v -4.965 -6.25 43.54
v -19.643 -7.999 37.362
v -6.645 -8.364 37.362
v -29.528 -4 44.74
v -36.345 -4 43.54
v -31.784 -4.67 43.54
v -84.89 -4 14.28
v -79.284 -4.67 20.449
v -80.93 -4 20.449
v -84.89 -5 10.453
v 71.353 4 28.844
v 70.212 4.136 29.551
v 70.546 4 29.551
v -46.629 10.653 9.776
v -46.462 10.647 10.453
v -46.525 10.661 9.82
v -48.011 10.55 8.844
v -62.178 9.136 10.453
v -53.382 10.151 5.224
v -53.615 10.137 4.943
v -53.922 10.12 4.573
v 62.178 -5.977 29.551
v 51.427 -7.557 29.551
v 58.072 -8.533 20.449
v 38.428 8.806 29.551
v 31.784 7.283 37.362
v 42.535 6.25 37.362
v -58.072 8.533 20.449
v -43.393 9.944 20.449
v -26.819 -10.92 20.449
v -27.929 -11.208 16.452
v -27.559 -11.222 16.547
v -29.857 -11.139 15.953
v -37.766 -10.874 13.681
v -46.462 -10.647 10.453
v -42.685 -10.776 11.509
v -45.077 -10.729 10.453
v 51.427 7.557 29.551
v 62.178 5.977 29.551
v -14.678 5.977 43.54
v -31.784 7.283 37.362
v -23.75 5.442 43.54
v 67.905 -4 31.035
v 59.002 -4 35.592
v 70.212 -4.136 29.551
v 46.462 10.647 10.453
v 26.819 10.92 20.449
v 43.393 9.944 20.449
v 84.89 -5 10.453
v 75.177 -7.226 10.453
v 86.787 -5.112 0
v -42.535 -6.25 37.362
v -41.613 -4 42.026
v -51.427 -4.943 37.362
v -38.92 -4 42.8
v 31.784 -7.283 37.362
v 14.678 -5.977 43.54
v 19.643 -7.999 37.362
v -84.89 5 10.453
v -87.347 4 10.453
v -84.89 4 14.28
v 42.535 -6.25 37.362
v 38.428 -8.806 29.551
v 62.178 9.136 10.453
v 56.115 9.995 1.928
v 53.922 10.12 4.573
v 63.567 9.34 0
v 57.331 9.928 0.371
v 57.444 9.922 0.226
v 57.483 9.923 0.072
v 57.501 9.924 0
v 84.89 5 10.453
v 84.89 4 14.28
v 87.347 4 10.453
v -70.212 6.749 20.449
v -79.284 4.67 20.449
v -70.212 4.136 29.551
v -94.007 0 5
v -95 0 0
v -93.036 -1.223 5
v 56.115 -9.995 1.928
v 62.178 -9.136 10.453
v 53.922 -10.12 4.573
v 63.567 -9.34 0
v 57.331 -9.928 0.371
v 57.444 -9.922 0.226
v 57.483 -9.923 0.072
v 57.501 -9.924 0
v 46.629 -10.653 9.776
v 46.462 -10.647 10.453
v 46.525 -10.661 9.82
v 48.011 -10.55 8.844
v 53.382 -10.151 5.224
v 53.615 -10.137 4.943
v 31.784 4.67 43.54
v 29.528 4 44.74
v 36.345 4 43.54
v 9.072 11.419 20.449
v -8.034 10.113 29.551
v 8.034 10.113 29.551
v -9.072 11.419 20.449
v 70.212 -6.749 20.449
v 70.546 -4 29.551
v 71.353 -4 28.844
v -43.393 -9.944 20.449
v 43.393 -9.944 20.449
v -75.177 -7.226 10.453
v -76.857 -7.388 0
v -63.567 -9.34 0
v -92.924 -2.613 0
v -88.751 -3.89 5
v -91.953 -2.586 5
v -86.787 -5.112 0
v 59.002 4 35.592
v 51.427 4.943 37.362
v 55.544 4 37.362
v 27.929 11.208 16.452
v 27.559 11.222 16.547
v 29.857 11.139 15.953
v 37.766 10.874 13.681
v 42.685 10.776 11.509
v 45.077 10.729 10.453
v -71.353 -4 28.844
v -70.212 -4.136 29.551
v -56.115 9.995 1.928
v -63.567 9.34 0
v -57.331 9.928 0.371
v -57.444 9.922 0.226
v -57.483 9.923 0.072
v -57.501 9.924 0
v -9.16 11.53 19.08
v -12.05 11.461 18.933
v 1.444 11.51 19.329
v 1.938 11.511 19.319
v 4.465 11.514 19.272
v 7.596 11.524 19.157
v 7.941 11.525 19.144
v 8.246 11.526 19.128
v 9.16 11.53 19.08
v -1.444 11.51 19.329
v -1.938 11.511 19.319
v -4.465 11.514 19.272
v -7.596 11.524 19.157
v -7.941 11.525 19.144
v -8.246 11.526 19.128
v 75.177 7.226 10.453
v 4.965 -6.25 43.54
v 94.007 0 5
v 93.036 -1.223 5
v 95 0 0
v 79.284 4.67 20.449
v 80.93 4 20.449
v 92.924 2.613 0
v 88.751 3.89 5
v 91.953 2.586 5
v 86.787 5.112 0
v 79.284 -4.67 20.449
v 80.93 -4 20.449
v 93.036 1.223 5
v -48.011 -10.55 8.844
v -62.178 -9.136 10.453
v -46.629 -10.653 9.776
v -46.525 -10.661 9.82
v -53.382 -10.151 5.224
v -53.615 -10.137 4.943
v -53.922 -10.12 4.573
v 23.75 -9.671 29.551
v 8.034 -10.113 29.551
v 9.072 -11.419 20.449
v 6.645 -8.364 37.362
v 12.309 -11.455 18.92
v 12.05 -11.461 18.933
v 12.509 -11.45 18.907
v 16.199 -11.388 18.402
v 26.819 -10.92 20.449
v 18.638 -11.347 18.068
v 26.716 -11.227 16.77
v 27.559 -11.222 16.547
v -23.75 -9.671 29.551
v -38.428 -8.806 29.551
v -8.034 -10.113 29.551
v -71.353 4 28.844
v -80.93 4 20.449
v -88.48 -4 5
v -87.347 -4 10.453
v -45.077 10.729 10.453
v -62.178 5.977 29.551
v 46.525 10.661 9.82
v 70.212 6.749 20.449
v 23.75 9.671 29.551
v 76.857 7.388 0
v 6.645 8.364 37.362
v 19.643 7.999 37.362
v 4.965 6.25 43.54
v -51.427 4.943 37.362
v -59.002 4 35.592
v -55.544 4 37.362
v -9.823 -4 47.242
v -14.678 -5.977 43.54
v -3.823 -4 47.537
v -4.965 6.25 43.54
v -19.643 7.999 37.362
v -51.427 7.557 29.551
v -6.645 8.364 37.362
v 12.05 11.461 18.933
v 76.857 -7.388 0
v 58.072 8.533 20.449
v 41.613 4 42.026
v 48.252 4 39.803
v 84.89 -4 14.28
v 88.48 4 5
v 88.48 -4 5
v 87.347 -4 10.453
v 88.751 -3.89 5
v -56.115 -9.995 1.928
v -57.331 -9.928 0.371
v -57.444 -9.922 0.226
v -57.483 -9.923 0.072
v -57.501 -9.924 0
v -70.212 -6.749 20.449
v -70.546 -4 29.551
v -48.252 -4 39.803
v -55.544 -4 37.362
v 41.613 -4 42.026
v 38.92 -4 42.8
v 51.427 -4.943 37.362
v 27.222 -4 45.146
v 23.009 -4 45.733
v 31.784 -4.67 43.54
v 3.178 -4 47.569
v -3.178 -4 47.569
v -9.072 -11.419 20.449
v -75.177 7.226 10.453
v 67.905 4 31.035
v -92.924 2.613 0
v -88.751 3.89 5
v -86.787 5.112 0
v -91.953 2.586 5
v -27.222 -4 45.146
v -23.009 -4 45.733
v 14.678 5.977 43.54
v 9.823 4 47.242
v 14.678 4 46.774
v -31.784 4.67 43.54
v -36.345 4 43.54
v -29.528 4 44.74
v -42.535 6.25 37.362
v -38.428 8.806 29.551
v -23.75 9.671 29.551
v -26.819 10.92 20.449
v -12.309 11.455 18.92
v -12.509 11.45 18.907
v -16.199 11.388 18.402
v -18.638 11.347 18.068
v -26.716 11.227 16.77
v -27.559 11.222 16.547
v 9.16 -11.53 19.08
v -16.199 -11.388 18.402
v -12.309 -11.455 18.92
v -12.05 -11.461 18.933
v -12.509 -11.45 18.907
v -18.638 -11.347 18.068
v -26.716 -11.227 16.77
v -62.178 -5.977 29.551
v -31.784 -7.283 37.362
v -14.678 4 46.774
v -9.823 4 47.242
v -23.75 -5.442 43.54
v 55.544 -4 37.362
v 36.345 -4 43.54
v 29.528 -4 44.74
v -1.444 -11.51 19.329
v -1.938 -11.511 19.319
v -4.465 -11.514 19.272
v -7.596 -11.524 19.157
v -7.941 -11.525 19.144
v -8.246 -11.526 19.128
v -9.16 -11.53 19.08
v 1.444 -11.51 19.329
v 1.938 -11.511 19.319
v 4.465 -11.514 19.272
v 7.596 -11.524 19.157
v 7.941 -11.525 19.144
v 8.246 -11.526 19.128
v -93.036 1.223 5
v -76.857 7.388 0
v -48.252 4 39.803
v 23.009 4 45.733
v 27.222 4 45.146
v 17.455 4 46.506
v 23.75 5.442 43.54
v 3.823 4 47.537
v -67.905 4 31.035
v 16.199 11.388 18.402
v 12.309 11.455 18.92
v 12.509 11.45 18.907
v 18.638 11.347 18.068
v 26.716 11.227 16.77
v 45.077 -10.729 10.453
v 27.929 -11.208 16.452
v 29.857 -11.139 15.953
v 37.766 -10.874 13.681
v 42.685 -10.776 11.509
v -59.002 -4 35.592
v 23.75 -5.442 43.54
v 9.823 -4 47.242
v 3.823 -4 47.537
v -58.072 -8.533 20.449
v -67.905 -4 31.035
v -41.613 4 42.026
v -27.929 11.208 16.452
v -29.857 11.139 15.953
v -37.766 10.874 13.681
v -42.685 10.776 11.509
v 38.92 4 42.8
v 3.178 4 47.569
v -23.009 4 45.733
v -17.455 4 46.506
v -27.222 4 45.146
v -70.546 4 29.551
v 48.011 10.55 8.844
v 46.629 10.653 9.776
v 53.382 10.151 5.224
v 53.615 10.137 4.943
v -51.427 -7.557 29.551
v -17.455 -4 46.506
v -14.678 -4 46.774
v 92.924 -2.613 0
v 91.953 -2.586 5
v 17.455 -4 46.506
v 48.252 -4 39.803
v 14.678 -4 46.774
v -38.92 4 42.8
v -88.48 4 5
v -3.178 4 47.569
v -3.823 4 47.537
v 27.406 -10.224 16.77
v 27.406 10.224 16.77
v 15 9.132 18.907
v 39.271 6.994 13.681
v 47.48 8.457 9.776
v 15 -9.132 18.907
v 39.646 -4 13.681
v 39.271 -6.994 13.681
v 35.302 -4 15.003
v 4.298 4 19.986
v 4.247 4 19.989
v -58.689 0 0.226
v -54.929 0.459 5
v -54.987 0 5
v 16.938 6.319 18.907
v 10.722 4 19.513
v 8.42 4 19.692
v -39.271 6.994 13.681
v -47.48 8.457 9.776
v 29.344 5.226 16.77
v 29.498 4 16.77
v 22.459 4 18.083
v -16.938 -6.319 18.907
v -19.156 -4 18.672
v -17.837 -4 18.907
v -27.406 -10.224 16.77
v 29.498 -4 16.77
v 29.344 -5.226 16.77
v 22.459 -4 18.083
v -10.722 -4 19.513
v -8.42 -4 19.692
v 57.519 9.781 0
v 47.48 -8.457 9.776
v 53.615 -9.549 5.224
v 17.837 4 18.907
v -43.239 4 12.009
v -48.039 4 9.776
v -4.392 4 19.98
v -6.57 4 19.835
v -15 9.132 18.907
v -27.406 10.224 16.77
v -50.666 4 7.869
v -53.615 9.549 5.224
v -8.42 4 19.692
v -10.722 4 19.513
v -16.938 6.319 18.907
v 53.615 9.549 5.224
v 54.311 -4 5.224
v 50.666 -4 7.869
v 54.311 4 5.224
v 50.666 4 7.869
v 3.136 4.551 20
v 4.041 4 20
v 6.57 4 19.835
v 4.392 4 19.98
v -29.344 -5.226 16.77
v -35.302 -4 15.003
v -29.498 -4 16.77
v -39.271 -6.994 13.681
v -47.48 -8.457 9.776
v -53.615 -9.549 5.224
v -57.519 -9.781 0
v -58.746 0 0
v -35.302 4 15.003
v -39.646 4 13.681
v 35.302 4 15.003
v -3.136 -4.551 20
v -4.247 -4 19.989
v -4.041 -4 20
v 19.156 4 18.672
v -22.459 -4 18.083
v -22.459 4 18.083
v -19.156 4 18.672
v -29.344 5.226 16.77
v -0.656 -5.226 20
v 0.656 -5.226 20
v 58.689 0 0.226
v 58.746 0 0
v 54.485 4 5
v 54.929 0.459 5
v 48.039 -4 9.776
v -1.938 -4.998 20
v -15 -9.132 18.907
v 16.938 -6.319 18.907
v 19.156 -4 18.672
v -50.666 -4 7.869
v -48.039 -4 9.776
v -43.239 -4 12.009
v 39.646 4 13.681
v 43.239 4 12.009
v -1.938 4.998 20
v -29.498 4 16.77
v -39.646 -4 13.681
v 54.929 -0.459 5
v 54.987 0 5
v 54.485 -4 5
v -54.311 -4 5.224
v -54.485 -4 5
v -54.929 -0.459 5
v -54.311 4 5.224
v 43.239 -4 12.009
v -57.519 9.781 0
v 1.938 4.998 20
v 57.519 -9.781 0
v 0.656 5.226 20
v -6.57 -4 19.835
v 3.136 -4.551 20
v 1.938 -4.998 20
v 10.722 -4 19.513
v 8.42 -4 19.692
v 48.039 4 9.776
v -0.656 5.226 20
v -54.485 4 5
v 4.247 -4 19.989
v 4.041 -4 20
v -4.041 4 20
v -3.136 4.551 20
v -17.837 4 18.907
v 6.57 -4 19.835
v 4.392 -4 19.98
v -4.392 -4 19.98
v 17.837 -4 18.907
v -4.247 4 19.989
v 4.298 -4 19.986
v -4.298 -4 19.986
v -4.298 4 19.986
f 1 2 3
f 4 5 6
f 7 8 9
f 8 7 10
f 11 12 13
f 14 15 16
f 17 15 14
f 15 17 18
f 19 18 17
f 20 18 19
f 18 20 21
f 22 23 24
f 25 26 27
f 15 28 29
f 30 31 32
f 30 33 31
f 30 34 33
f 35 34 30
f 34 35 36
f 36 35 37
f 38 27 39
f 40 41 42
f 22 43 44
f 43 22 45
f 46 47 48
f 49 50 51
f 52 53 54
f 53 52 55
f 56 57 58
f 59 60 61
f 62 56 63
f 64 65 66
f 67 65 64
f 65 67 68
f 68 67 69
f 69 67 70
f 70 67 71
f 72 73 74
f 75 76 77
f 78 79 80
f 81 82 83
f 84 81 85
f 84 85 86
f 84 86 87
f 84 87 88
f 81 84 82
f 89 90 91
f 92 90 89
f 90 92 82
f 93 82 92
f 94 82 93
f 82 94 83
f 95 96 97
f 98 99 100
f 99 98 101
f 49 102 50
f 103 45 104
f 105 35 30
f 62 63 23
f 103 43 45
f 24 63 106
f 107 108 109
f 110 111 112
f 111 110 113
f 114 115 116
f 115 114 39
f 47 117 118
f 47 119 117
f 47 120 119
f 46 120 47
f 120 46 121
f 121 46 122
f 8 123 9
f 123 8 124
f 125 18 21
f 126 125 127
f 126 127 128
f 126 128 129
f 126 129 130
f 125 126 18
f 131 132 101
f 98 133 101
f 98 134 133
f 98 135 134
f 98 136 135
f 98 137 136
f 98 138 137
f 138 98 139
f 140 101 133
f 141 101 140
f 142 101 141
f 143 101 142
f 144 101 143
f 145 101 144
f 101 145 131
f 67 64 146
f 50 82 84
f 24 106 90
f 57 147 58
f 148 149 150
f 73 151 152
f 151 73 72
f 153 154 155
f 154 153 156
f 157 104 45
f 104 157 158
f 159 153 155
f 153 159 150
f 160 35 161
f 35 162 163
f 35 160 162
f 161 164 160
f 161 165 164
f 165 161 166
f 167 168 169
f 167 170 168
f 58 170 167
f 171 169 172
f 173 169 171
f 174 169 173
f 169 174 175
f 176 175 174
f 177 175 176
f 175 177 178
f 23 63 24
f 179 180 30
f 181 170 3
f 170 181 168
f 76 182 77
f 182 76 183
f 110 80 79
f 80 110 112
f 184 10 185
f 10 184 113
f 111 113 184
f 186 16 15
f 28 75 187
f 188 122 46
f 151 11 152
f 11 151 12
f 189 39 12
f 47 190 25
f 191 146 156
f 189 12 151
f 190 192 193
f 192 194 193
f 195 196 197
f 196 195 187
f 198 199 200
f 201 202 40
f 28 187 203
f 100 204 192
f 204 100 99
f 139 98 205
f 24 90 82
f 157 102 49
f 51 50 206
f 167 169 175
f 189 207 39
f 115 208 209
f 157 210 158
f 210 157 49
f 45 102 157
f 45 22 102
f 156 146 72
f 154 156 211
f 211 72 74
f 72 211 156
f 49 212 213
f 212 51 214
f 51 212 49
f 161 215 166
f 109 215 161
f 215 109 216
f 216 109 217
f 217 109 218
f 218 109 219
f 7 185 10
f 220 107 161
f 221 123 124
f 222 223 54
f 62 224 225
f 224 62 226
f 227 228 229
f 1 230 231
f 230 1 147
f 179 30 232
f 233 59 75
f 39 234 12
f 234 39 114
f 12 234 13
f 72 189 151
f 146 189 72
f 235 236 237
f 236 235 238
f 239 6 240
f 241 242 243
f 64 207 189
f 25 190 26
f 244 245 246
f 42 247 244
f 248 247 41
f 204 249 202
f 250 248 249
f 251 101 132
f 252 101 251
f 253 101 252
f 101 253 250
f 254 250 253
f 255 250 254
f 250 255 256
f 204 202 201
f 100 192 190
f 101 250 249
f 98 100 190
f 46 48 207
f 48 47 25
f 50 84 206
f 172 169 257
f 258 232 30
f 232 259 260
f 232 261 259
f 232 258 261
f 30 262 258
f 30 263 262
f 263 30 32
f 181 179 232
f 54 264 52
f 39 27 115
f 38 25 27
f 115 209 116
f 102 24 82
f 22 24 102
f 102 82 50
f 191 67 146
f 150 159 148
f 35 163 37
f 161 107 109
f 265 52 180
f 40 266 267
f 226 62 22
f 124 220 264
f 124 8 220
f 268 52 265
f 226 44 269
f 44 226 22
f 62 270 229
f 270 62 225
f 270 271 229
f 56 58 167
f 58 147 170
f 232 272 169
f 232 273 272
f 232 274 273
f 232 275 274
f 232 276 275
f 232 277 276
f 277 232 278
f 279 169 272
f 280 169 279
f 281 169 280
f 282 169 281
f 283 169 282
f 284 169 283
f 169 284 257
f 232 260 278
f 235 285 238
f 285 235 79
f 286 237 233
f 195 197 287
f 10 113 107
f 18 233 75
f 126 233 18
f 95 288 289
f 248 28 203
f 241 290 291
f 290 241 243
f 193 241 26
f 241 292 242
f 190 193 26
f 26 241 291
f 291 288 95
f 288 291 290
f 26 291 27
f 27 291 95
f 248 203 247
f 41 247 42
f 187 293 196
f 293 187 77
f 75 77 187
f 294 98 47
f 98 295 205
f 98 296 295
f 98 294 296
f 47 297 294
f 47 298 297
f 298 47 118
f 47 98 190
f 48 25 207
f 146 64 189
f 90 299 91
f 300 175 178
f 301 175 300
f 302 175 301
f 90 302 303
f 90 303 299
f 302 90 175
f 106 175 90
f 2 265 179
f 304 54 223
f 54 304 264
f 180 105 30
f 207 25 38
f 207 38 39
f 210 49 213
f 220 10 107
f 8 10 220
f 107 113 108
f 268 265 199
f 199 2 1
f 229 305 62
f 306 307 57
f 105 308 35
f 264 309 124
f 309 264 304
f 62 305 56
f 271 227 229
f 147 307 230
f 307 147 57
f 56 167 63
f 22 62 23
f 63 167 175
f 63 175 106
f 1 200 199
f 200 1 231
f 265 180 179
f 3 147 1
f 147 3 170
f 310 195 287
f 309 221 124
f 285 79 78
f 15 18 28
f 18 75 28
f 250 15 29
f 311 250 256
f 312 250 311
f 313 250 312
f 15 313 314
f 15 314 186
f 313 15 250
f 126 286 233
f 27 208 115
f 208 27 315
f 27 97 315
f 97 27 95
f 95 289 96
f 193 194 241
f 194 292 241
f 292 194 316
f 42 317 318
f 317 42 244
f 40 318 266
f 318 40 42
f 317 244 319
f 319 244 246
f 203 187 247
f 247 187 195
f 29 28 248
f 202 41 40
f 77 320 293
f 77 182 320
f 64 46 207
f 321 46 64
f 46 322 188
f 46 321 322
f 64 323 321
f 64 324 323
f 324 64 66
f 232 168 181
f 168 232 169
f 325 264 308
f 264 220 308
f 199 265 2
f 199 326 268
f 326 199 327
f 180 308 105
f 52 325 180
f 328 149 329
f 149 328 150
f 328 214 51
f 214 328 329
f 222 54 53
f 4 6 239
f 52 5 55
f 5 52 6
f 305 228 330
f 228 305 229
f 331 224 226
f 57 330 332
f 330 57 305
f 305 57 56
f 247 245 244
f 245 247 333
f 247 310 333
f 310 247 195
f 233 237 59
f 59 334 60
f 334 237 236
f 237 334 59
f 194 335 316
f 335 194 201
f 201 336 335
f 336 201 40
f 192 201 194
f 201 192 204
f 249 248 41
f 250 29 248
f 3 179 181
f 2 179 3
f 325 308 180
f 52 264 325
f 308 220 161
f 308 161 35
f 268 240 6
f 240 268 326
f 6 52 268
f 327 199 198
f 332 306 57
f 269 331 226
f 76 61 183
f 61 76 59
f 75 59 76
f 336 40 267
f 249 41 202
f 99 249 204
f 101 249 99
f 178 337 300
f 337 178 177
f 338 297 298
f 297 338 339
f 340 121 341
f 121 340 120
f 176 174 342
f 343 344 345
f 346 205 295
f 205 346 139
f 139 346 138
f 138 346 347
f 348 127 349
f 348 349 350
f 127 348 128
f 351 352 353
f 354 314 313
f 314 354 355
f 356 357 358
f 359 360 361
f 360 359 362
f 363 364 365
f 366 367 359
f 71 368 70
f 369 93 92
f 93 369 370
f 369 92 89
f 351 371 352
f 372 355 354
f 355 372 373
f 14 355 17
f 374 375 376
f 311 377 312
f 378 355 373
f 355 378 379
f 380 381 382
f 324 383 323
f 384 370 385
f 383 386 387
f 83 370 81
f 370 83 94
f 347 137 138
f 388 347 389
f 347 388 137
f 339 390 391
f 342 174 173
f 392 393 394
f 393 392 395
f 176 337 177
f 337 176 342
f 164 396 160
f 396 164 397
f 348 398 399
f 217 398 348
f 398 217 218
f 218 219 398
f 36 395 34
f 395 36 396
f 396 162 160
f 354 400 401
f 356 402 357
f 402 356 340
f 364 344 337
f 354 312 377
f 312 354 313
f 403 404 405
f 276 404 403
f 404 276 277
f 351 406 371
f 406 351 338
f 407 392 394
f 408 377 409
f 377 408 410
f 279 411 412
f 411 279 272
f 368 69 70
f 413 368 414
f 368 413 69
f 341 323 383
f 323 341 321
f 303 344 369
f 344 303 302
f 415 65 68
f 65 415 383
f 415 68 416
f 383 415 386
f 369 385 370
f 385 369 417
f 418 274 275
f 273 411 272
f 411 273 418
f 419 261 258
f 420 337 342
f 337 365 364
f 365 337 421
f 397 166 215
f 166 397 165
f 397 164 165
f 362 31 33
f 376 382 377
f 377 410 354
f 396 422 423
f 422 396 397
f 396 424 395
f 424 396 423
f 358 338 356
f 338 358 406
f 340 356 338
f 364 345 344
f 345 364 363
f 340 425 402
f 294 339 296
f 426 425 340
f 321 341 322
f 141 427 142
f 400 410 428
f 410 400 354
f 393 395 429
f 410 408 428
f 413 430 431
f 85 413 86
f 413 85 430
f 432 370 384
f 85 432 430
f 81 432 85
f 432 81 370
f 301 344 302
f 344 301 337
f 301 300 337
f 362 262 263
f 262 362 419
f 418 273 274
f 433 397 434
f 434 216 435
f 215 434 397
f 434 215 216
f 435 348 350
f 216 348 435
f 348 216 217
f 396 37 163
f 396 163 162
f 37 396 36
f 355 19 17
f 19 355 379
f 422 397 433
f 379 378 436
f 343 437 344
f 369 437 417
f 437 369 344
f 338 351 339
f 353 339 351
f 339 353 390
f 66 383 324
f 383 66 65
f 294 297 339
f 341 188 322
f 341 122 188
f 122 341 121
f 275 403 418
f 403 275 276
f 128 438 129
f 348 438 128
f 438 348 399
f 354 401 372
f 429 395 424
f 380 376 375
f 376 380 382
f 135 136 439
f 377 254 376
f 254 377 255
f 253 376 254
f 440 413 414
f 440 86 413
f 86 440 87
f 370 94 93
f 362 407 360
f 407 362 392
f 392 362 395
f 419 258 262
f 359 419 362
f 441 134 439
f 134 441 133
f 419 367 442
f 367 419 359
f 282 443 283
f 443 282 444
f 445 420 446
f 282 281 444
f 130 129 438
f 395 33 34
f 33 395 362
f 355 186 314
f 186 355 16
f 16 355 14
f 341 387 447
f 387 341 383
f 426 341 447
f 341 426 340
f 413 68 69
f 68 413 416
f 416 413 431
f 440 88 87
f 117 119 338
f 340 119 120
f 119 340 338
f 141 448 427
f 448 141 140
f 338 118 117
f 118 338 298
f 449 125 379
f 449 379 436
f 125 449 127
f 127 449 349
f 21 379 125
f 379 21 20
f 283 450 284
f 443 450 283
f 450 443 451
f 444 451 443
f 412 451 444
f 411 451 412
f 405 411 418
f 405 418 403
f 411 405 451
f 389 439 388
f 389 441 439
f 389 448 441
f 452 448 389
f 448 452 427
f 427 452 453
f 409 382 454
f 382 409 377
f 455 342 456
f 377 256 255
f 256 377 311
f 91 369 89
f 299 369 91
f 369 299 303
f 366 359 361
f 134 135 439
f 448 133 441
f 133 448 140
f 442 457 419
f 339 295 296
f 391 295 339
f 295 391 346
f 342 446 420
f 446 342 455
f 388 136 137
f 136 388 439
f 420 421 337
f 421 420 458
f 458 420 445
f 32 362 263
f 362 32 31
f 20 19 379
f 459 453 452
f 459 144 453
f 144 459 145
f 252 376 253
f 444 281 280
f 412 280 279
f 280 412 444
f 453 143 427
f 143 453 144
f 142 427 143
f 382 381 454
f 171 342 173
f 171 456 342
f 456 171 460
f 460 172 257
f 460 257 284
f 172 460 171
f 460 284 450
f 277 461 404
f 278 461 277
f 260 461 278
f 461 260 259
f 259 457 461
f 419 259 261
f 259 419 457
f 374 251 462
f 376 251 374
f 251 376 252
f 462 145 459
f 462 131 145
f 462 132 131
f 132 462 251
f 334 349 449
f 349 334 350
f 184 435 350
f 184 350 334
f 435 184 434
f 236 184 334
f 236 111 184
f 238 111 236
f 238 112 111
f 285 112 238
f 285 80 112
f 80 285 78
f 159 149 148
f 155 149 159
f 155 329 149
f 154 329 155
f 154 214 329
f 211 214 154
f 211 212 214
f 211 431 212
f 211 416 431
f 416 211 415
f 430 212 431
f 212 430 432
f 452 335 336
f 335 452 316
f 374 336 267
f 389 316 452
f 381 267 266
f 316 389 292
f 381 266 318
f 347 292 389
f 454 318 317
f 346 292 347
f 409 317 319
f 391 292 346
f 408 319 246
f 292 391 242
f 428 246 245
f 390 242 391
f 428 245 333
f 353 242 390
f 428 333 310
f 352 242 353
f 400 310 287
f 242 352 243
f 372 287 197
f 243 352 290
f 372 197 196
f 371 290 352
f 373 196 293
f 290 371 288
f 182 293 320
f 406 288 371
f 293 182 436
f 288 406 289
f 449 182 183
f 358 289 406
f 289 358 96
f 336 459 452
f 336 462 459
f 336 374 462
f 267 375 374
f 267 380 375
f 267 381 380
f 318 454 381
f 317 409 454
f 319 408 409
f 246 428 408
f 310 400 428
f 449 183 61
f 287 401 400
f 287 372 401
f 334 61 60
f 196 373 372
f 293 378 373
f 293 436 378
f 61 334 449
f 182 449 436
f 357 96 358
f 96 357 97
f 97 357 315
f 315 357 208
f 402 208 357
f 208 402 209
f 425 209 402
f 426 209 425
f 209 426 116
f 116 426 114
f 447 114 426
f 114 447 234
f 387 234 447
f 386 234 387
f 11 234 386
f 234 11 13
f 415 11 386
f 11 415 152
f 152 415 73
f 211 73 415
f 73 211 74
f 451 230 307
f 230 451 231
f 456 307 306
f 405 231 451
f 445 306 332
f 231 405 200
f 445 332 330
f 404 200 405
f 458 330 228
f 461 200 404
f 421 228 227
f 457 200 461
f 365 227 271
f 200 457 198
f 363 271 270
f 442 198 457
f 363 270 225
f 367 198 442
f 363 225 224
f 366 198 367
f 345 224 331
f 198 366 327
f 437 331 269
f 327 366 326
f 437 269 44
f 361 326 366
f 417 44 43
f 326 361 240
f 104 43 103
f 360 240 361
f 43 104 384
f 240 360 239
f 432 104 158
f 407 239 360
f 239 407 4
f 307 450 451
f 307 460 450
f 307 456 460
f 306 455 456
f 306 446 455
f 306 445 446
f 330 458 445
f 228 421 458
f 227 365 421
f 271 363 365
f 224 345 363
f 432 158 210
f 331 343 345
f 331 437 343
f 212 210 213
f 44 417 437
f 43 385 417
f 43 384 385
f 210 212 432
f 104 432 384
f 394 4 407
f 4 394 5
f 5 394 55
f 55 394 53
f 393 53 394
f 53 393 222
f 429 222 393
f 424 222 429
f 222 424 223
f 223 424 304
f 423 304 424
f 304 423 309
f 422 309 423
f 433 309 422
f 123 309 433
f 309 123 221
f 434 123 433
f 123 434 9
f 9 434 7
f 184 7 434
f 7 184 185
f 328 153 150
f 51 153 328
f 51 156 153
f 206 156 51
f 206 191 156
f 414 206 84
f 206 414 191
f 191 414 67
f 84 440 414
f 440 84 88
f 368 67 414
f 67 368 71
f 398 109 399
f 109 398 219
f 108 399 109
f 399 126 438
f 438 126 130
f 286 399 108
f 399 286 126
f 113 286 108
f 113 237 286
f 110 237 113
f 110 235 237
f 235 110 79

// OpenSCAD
// this is untested, but should be adapatable to any device witha bit of testing

slot_width = 8;
length = 190;
height = 100;
width = 50;
difference() { 
// Initial volume
resize([length,width/2,height])sphere(r=10, center=true);
// cutaway for arch
translate([0,0,-5])resize([length-70,width*2,50])sphere(r=10);
// slot for device
translate([0,0,height/2])cube([length,slot_width,height-10], center=true);
// flat base
translate([0,0,-height/2])cube([length,width,height], center=true);
}
